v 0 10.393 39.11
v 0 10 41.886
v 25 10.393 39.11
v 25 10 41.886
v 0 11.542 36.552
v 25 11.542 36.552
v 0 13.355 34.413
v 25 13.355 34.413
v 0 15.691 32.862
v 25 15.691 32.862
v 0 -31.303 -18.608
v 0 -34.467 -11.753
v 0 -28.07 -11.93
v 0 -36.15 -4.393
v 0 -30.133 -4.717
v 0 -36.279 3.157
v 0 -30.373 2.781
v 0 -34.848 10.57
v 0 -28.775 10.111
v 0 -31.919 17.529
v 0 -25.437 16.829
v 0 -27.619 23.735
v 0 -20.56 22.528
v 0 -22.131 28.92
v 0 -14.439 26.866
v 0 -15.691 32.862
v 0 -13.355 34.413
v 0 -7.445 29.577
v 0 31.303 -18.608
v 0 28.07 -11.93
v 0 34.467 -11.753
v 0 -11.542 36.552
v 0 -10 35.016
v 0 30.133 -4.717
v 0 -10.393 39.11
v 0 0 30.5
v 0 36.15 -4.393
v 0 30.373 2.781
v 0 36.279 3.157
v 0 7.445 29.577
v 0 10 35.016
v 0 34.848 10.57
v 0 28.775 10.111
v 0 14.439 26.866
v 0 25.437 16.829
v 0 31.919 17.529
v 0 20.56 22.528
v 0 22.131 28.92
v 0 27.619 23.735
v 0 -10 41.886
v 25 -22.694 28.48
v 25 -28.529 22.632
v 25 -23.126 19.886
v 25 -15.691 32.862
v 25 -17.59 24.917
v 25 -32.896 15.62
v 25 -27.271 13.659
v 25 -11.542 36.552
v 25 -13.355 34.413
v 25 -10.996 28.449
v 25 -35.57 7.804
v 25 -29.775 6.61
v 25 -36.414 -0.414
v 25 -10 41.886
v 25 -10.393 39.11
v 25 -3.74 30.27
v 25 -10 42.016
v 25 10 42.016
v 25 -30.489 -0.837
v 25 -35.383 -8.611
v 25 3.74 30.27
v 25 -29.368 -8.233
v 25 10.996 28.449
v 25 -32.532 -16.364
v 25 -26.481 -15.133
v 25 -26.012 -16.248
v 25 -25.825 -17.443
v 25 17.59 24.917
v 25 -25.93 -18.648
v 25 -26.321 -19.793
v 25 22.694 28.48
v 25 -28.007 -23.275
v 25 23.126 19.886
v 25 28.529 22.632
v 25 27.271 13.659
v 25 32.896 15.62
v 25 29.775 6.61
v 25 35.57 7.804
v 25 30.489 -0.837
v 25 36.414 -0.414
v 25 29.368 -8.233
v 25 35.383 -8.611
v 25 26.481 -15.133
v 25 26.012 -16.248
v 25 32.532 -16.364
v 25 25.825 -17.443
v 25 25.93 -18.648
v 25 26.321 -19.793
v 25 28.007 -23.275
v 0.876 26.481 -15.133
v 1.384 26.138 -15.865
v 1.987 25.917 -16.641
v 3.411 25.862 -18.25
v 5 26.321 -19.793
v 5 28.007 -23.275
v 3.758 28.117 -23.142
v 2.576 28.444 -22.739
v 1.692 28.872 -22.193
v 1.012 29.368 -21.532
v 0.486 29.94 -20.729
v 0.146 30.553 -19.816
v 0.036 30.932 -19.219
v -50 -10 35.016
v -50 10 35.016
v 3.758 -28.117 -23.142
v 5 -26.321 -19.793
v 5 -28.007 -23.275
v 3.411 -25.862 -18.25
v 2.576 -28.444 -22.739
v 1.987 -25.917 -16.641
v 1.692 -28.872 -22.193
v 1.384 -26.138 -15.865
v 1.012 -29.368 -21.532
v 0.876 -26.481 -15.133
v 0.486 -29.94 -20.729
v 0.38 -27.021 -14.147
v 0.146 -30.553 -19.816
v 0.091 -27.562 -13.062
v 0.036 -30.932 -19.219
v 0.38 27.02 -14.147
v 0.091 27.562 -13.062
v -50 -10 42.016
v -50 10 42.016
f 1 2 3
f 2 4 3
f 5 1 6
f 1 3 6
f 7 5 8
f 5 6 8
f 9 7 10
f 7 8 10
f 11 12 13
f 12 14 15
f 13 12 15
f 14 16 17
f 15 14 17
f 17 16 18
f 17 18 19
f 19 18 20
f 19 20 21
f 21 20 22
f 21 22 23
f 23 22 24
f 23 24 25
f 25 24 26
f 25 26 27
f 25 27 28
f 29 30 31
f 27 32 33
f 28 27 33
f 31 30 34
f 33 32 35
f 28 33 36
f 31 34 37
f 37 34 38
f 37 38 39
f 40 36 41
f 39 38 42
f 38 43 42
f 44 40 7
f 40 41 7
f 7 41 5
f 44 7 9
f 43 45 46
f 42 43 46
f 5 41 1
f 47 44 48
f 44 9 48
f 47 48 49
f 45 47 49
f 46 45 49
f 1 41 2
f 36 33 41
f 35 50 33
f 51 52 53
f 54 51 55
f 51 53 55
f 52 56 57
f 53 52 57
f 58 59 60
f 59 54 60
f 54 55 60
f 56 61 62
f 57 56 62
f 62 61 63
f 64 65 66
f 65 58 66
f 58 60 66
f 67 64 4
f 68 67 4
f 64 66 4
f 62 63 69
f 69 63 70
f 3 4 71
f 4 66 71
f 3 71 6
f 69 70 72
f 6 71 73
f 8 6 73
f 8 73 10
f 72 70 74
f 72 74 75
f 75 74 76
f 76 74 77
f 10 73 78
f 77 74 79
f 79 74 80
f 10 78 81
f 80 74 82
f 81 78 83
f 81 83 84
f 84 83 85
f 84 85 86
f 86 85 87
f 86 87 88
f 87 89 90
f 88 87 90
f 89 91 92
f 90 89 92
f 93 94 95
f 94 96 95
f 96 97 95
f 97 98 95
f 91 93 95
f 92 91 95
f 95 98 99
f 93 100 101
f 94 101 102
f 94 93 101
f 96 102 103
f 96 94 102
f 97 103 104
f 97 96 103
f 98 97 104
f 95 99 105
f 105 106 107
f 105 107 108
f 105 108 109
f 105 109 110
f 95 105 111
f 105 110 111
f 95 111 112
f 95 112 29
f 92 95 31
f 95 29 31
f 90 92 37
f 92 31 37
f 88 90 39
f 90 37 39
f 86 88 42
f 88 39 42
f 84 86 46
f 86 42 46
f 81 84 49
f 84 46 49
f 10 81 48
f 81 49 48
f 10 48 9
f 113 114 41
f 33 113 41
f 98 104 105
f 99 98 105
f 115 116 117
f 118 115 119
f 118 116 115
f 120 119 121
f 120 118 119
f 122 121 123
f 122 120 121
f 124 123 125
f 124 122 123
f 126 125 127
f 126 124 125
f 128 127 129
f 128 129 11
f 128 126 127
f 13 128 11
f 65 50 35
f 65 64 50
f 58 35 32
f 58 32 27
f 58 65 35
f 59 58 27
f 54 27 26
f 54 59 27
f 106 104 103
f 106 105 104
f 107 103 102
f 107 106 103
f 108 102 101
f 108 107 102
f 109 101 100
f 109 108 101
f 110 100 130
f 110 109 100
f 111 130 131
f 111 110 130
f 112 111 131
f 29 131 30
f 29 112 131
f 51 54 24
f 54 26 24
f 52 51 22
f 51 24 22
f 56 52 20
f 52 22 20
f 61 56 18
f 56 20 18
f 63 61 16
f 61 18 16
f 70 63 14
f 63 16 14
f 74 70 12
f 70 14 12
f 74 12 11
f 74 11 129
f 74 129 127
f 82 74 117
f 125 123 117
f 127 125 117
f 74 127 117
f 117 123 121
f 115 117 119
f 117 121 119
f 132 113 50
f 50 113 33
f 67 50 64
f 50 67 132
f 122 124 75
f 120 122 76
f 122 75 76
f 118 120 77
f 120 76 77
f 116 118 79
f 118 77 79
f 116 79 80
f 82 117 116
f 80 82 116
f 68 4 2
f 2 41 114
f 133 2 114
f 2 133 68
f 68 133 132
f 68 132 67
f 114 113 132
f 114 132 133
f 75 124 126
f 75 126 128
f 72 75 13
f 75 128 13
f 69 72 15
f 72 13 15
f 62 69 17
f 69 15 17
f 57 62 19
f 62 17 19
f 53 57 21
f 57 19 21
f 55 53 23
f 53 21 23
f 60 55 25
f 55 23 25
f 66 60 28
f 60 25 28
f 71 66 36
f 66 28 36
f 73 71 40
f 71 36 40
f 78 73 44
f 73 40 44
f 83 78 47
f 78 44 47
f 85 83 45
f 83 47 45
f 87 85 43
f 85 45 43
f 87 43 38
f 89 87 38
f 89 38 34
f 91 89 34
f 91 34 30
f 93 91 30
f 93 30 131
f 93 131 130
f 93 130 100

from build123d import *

# Parameters (mm, degrees)
F1_DEPTH = 25
F2_W     = 75
F2_H     = 15
F2_W_2   = 25
F3_DEPTH = 7
F4_R     = 5
F6_W     = 50
F6_H     = 20
F6_W_2   = 25
F7_DEPTH = 7
F8_R     = 10


with BuildPart() as f1:
    # F0 (on Right) → F1 (new body)
    with BuildSketch(Plane.YZ):
        with BuildLine():
            ThreePointArc((-25.1164593902, -17.3035680626), (0, 30.5), (25.1164593902, -17.3035680626))
            Line((25.1164593902, -17.3035680626), (28.0068792885, -23.275158049))
            ThreePointArc((28.0068792885, -23.275158049), (34.7936009681, 10.7481906084), (10, 35.015971637))
            Line((10, 35.015971637), (-10, 35.015971637))
            ThreePointArc((-10, 35.015971637), (-34.7936009681, 10.7481906084), (-28.0068792885, -23.275158049))
            Line((-28.0068792885, -23.275158049), (-25.1164593902, -17.3035680626))
        make_face()
    extrude(amount=F1_DEPTH)

    # F4
    f4_edges = [f1.edges().sort_by_distance(p)[0] for p in [
        (0, -26.561669, -20.289363),
        (12.5, 25.116459, -17.303568),
        (12.5, -25.116459, -17.303568),
        (0, 26.561669, -20.289363),
    ]]
    fillet(f4_edges, radius=F4_R)

    # F6 (on face) → F7 (join)
    with BuildSketch(Plane.XY.offset(35.015971637)):
        with Locations((-25, 0)):
            Rectangle(F6_W, F6_H)
        with Locations((12.5, 0)):
            Rectangle(F6_W_2, F6_H)
    extrude(amount=F7_DEPTH)

    # F8
    f8_edges = [f1.edges().sort_by_distance(p)[0] for p in [
        (12.5, -10, 35.015972),
        (12.5, 10, 35.015972),
    ]]
    fillet(f8_edges, radius=F8_R)


with BuildPart() as f3:
    # F2 (on face) → F3 (new body)
    with BuildSketch(Plane.XY.offset(35.015971637)):
        with Locations((-37.5, 0)):
            Rectangle(F2_W, F2_H)
        with Locations((12.5, 0)):
            Rectangle(F2_W_2, F2_H)
    extrude(amount=F3_DEPTH)


solid = f1.part
